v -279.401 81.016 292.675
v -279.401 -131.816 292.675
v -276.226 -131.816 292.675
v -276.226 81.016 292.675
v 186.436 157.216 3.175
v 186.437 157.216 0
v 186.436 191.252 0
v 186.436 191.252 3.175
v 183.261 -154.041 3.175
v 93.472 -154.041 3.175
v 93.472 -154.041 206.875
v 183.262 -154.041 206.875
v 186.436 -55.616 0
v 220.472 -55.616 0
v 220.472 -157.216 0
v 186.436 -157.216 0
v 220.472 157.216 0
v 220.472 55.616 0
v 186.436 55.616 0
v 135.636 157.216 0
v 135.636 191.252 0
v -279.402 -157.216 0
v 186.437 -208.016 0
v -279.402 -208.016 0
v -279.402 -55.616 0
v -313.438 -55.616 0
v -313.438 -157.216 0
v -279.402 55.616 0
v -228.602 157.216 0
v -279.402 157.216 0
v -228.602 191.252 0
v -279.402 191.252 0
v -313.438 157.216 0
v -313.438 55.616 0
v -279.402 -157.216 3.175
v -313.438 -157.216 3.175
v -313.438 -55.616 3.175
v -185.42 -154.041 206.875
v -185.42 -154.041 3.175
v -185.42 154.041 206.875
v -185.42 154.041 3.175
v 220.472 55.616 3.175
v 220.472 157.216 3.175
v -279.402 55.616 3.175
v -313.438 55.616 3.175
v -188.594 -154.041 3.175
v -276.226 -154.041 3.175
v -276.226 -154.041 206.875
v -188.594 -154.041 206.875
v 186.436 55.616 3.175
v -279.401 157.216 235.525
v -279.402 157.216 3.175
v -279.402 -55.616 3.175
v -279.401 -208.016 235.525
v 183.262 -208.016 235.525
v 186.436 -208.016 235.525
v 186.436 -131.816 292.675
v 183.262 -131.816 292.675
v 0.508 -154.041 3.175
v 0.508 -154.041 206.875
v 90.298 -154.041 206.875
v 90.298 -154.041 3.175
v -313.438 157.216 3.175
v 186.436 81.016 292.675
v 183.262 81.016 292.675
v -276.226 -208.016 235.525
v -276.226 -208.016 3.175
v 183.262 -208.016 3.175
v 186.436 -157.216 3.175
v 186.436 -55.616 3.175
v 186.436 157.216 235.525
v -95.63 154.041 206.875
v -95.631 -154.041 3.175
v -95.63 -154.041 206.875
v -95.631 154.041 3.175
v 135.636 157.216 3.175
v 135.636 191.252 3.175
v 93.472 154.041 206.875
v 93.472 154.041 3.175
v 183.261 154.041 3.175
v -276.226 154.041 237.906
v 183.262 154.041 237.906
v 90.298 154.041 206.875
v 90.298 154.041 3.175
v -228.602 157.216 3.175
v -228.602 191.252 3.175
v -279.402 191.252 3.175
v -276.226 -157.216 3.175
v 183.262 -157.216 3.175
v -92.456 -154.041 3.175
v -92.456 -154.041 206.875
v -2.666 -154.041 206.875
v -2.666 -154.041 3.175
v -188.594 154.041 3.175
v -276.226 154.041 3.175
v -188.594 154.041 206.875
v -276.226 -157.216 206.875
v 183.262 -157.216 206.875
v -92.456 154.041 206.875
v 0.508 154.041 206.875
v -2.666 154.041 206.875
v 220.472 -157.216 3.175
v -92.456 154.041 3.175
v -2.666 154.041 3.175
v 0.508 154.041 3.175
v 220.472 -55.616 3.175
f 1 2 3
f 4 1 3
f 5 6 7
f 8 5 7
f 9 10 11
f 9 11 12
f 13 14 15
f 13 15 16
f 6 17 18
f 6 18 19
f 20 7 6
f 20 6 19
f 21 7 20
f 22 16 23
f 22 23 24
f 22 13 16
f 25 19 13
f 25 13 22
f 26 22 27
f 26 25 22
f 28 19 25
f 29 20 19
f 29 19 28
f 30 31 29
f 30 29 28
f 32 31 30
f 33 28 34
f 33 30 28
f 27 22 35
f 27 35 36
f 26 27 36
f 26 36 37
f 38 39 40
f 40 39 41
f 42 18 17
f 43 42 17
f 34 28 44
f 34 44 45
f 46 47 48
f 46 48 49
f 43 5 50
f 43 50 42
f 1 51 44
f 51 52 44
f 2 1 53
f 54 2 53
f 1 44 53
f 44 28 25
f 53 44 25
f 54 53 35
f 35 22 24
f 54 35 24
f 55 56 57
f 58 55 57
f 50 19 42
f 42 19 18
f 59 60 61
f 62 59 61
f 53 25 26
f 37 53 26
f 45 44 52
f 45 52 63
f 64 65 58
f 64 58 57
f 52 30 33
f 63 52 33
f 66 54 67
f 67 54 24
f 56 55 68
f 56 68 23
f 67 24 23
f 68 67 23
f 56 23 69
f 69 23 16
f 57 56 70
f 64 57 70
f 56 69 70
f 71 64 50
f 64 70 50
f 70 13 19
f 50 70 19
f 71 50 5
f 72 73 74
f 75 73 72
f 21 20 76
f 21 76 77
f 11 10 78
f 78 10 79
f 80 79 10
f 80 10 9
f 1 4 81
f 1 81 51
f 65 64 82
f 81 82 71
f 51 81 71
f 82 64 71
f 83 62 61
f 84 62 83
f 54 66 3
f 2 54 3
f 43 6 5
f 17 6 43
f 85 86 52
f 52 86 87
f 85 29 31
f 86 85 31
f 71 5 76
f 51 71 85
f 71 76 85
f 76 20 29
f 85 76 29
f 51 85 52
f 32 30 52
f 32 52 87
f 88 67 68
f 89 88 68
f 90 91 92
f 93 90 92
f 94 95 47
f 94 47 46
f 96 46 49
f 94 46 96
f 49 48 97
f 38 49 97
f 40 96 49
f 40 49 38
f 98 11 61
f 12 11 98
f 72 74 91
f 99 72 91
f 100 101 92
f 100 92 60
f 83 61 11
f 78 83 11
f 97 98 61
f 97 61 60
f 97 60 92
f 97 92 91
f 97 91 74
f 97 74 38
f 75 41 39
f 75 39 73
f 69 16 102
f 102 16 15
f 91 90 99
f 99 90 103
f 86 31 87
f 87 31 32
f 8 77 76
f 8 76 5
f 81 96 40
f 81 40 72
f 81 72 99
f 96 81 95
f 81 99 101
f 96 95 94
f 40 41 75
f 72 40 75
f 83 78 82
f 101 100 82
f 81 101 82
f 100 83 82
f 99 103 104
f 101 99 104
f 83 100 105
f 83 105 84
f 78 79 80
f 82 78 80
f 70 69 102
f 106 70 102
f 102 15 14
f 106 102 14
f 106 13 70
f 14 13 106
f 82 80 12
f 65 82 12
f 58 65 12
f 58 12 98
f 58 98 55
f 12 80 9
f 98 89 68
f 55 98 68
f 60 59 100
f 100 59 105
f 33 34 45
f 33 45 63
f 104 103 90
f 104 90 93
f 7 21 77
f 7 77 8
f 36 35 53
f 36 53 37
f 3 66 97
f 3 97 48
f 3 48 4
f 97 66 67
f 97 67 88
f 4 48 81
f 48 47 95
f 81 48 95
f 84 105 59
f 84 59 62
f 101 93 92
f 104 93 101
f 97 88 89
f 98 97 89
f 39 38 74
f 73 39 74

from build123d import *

# Parameters (mm, degrees)
SKETCH1_W           = 465.838
SKETCH1_H           = 365.232
BOSS_EXTRUDE1_DEPTH = 3.175
SKETCH2_W           = 465.838
SKETCH2_H           = 365.232
SKETCH2_W_2         = 459.488
SKETCH2_H_2         = 47.625
SKETCH2_W_3         = 89.789
SKETCH2_H_3         = 308.082
SKETCH2_W_4         = 87.632
BOSS_EXTRUDE2_DEPTH = 200.6
SKETCH4_W           = 459.488
SKETCH4_H           = 200.6
CUT_EXTRUDE1_DEPTH  = 3.175
SKETCH5_W           = 89.789
SKETCH5_H           = 308.082
SKETCH5_W_2         = 87.632
BOSS_EXTRUDE5_DEPTH = 38.1
CUT_EXTRUDE2_DEPTH  = 35
BOSS_EXTRUDE6_DEPTH = 50.8
CUT_EXTRUDE3_DEPTH  = 589.161843479
SKETCH10_W          = 34.036
SKETCH10_H          = 101.6
SKETCH10_W_2        = 50.8
SKETCH10_H_2        = 34.036
BOSS_EXTRUDE7_DEPTH = 3.175


with BuildPart() as part:
    # Sketch1 → Boss-Extrude1 (new body)
    with BuildSketch(Plane.XY):
        with Locations((-46.4825, -25.4)):
            Rectangle(SKETCH1_W, SKETCH1_H)
    extrude(amount=BOSS_EXTRUDE1_DEPTH)

    # Sketch2 → Boss-Extrude2 (add)
    with BuildSketch(Plane.XY.offset(3.175)):
        with Locations((-46.4825, -25.4)):
            Rectangle(SKETCH2_W, SKETCH2_H)
        with Locations((-46.4825, -181.0285)):
            Rectangle(SKETCH2_W_2, SKETCH2_H_2, mode=Mode.SUBTRACT)
        with Locations((138.367, 0)):
            Rectangle(SKETCH2_W_3, SKETCH2_H_3, mode=Mode.SUBTRACT)
        with Locations((45.403, 0)):
            Rectangle(SKETCH2_W_3, SKETCH2_H_3, mode=Mode.SUBTRACT)
        with Locations((-47.561, 0)):
            Rectangle(SKETCH2_W_3, SKETCH2_H_3, mode=Mode.SUBTRACT)
        with Locations((-140.525, 0)):
            Rectangle(SKETCH2_W_3, SKETCH2_H_3, mode=Mode.SUBTRACT)
        with Locations((-232.4105, 0)):
            Rectangle(SKETCH2_W_4, SKETCH2_H_3, mode=Mode.SUBTRACT)
    extrude(amount=BOSS_EXTRUDE2_DEPTH)

    # Sketch4 → Cut-Extrude1 (cut)
    with BuildSketch(Plane.XZ.offset(208.016)):
        with Locations((-46.4825, 103.475)):
            Rectangle(SKETCH4_W, SKETCH4_H)
    extrude(amount=-CUT_EXTRUDE1_DEPTH, mode=Mode.SUBTRACT)

    # Sketch5 → Boss-Extrude5 (add)
    with BuildSketch(Plane.XY.offset(203.775)):
        Polygon((186.4365, 157.216), (-279.4015, 157.216), (-279.4015, -208.016), (-276.2265, -208.016), (-276.2265, -157.216), (183.2615, -157.216), (183.2615, -208.016), (186.4365, -208.016), align=None)
        with Locations((-140.525, 0)):
            Rectangle(SKETCH5_W, SKETCH5_H, mode=Mode.SUBTRACT)
        with Locations((-47.561, 0)):
            Rectangle(SKETCH5_W, SKETCH5_H, mode=Mode.SUBTRACT)
        with Locations((45.403, 0)):
            Rectangle(SKETCH5_W, SKETCH5_H, mode=Mode.SUBTRACT)
        with Locations((138.367, 0)):
            Rectangle(SKETCH5_W, SKETCH5_H, mode=Mode.SUBTRACT)
        with Locations((-232.4105, 0)):
            Rectangle(SKETCH5_W_2, SKETCH5_H, mode=Mode.SUBTRACT)
    extrude(amount=BOSS_EXTRUDE5_DEPTH)

    # Sketch7 → Cut-Extrude2 (cut)
    with BuildSketch(Plane.XY.offset(241.875)):
        Polygon((-185.4195, -154.041), (-185.4195, 154.041), (-188.5945, 154.041), (-188.5945, -154.041), (-276.2265, -154.041), (-276.2265, -157.216), (183.2615, -157.216), (183.2615, -154.041), (93.4725, -154.041), (93.4725, 154.041), (90.2975, 154.041), (90.2975, -154.041), (0.5085, -154.041), (0.5085, 154.041), (-2.6665, 154.041), (-2.6665, -154.041), (-92.4555, -154.041), (-92.4555, 154.041), (-95.6305, 154.041), (-95.6305, -154.041), align=None)
    extrude(amount=-CUT_EXTRUDE2_DEPTH, mode=Mode.SUBTRACT)

    # Sketch8 → Boss-Extrude6 (add)
    with BuildSketch(Plane.XY.offset(241.875)):
        Polygon((183.2615, 154.041), (183.2615, -208.016), (186.4365, -208.016), (186.4365, 157.216), (-279.4015, 157.216), (-279.4015, -208.016), (-276.2265, -208.016), (-276.2265, 154.041), align=None)
    extrude(amount=BOSS_EXTRUDE6_DEPTH)

    # Sketch9 → Cut-Extrude3 (cut, through all)
    with BuildSketch(Plane(origin=(186.4365, 0, 0), x_dir=(0, 0, -1), z_dir=(1, 0, 0))):
        Polygon((-292.675, -208.016), (-235.525, -208.016), (-292.675, -131.816), align=None)
        Polygon((-292.675, 157.216), (-292.675, 81.016), (-235.525, 157.216), align=None)
    extrude(amount=-CUT_EXTRUDE3_DEPTH, mode=Mode.SUBTRACT)

    # Sketch10 → Boss-Extrude7 (add)
    with BuildSketch(Plane.XY):
        with Locations((203.4545, 106.416)):
            Rectangle(SKETCH10_W, SKETCH10_H)
        with Locations((203.4545, -106.416)):
            Rectangle(SKETCH10_W, SKETCH10_H)
        with Locations((161.0365, 174.234)):
            Rectangle(SKETCH10_W_2, SKETCH10_H_2)
    boss_extrude7 = extrude(amount=BOSS_EXTRUDE7_DEPTH)

    # Mirror1: Boss-Extrude7 across plane
    add(boss_extrude7.mirror(Plane.ZY.offset(46.4825)))


solid = part.part
